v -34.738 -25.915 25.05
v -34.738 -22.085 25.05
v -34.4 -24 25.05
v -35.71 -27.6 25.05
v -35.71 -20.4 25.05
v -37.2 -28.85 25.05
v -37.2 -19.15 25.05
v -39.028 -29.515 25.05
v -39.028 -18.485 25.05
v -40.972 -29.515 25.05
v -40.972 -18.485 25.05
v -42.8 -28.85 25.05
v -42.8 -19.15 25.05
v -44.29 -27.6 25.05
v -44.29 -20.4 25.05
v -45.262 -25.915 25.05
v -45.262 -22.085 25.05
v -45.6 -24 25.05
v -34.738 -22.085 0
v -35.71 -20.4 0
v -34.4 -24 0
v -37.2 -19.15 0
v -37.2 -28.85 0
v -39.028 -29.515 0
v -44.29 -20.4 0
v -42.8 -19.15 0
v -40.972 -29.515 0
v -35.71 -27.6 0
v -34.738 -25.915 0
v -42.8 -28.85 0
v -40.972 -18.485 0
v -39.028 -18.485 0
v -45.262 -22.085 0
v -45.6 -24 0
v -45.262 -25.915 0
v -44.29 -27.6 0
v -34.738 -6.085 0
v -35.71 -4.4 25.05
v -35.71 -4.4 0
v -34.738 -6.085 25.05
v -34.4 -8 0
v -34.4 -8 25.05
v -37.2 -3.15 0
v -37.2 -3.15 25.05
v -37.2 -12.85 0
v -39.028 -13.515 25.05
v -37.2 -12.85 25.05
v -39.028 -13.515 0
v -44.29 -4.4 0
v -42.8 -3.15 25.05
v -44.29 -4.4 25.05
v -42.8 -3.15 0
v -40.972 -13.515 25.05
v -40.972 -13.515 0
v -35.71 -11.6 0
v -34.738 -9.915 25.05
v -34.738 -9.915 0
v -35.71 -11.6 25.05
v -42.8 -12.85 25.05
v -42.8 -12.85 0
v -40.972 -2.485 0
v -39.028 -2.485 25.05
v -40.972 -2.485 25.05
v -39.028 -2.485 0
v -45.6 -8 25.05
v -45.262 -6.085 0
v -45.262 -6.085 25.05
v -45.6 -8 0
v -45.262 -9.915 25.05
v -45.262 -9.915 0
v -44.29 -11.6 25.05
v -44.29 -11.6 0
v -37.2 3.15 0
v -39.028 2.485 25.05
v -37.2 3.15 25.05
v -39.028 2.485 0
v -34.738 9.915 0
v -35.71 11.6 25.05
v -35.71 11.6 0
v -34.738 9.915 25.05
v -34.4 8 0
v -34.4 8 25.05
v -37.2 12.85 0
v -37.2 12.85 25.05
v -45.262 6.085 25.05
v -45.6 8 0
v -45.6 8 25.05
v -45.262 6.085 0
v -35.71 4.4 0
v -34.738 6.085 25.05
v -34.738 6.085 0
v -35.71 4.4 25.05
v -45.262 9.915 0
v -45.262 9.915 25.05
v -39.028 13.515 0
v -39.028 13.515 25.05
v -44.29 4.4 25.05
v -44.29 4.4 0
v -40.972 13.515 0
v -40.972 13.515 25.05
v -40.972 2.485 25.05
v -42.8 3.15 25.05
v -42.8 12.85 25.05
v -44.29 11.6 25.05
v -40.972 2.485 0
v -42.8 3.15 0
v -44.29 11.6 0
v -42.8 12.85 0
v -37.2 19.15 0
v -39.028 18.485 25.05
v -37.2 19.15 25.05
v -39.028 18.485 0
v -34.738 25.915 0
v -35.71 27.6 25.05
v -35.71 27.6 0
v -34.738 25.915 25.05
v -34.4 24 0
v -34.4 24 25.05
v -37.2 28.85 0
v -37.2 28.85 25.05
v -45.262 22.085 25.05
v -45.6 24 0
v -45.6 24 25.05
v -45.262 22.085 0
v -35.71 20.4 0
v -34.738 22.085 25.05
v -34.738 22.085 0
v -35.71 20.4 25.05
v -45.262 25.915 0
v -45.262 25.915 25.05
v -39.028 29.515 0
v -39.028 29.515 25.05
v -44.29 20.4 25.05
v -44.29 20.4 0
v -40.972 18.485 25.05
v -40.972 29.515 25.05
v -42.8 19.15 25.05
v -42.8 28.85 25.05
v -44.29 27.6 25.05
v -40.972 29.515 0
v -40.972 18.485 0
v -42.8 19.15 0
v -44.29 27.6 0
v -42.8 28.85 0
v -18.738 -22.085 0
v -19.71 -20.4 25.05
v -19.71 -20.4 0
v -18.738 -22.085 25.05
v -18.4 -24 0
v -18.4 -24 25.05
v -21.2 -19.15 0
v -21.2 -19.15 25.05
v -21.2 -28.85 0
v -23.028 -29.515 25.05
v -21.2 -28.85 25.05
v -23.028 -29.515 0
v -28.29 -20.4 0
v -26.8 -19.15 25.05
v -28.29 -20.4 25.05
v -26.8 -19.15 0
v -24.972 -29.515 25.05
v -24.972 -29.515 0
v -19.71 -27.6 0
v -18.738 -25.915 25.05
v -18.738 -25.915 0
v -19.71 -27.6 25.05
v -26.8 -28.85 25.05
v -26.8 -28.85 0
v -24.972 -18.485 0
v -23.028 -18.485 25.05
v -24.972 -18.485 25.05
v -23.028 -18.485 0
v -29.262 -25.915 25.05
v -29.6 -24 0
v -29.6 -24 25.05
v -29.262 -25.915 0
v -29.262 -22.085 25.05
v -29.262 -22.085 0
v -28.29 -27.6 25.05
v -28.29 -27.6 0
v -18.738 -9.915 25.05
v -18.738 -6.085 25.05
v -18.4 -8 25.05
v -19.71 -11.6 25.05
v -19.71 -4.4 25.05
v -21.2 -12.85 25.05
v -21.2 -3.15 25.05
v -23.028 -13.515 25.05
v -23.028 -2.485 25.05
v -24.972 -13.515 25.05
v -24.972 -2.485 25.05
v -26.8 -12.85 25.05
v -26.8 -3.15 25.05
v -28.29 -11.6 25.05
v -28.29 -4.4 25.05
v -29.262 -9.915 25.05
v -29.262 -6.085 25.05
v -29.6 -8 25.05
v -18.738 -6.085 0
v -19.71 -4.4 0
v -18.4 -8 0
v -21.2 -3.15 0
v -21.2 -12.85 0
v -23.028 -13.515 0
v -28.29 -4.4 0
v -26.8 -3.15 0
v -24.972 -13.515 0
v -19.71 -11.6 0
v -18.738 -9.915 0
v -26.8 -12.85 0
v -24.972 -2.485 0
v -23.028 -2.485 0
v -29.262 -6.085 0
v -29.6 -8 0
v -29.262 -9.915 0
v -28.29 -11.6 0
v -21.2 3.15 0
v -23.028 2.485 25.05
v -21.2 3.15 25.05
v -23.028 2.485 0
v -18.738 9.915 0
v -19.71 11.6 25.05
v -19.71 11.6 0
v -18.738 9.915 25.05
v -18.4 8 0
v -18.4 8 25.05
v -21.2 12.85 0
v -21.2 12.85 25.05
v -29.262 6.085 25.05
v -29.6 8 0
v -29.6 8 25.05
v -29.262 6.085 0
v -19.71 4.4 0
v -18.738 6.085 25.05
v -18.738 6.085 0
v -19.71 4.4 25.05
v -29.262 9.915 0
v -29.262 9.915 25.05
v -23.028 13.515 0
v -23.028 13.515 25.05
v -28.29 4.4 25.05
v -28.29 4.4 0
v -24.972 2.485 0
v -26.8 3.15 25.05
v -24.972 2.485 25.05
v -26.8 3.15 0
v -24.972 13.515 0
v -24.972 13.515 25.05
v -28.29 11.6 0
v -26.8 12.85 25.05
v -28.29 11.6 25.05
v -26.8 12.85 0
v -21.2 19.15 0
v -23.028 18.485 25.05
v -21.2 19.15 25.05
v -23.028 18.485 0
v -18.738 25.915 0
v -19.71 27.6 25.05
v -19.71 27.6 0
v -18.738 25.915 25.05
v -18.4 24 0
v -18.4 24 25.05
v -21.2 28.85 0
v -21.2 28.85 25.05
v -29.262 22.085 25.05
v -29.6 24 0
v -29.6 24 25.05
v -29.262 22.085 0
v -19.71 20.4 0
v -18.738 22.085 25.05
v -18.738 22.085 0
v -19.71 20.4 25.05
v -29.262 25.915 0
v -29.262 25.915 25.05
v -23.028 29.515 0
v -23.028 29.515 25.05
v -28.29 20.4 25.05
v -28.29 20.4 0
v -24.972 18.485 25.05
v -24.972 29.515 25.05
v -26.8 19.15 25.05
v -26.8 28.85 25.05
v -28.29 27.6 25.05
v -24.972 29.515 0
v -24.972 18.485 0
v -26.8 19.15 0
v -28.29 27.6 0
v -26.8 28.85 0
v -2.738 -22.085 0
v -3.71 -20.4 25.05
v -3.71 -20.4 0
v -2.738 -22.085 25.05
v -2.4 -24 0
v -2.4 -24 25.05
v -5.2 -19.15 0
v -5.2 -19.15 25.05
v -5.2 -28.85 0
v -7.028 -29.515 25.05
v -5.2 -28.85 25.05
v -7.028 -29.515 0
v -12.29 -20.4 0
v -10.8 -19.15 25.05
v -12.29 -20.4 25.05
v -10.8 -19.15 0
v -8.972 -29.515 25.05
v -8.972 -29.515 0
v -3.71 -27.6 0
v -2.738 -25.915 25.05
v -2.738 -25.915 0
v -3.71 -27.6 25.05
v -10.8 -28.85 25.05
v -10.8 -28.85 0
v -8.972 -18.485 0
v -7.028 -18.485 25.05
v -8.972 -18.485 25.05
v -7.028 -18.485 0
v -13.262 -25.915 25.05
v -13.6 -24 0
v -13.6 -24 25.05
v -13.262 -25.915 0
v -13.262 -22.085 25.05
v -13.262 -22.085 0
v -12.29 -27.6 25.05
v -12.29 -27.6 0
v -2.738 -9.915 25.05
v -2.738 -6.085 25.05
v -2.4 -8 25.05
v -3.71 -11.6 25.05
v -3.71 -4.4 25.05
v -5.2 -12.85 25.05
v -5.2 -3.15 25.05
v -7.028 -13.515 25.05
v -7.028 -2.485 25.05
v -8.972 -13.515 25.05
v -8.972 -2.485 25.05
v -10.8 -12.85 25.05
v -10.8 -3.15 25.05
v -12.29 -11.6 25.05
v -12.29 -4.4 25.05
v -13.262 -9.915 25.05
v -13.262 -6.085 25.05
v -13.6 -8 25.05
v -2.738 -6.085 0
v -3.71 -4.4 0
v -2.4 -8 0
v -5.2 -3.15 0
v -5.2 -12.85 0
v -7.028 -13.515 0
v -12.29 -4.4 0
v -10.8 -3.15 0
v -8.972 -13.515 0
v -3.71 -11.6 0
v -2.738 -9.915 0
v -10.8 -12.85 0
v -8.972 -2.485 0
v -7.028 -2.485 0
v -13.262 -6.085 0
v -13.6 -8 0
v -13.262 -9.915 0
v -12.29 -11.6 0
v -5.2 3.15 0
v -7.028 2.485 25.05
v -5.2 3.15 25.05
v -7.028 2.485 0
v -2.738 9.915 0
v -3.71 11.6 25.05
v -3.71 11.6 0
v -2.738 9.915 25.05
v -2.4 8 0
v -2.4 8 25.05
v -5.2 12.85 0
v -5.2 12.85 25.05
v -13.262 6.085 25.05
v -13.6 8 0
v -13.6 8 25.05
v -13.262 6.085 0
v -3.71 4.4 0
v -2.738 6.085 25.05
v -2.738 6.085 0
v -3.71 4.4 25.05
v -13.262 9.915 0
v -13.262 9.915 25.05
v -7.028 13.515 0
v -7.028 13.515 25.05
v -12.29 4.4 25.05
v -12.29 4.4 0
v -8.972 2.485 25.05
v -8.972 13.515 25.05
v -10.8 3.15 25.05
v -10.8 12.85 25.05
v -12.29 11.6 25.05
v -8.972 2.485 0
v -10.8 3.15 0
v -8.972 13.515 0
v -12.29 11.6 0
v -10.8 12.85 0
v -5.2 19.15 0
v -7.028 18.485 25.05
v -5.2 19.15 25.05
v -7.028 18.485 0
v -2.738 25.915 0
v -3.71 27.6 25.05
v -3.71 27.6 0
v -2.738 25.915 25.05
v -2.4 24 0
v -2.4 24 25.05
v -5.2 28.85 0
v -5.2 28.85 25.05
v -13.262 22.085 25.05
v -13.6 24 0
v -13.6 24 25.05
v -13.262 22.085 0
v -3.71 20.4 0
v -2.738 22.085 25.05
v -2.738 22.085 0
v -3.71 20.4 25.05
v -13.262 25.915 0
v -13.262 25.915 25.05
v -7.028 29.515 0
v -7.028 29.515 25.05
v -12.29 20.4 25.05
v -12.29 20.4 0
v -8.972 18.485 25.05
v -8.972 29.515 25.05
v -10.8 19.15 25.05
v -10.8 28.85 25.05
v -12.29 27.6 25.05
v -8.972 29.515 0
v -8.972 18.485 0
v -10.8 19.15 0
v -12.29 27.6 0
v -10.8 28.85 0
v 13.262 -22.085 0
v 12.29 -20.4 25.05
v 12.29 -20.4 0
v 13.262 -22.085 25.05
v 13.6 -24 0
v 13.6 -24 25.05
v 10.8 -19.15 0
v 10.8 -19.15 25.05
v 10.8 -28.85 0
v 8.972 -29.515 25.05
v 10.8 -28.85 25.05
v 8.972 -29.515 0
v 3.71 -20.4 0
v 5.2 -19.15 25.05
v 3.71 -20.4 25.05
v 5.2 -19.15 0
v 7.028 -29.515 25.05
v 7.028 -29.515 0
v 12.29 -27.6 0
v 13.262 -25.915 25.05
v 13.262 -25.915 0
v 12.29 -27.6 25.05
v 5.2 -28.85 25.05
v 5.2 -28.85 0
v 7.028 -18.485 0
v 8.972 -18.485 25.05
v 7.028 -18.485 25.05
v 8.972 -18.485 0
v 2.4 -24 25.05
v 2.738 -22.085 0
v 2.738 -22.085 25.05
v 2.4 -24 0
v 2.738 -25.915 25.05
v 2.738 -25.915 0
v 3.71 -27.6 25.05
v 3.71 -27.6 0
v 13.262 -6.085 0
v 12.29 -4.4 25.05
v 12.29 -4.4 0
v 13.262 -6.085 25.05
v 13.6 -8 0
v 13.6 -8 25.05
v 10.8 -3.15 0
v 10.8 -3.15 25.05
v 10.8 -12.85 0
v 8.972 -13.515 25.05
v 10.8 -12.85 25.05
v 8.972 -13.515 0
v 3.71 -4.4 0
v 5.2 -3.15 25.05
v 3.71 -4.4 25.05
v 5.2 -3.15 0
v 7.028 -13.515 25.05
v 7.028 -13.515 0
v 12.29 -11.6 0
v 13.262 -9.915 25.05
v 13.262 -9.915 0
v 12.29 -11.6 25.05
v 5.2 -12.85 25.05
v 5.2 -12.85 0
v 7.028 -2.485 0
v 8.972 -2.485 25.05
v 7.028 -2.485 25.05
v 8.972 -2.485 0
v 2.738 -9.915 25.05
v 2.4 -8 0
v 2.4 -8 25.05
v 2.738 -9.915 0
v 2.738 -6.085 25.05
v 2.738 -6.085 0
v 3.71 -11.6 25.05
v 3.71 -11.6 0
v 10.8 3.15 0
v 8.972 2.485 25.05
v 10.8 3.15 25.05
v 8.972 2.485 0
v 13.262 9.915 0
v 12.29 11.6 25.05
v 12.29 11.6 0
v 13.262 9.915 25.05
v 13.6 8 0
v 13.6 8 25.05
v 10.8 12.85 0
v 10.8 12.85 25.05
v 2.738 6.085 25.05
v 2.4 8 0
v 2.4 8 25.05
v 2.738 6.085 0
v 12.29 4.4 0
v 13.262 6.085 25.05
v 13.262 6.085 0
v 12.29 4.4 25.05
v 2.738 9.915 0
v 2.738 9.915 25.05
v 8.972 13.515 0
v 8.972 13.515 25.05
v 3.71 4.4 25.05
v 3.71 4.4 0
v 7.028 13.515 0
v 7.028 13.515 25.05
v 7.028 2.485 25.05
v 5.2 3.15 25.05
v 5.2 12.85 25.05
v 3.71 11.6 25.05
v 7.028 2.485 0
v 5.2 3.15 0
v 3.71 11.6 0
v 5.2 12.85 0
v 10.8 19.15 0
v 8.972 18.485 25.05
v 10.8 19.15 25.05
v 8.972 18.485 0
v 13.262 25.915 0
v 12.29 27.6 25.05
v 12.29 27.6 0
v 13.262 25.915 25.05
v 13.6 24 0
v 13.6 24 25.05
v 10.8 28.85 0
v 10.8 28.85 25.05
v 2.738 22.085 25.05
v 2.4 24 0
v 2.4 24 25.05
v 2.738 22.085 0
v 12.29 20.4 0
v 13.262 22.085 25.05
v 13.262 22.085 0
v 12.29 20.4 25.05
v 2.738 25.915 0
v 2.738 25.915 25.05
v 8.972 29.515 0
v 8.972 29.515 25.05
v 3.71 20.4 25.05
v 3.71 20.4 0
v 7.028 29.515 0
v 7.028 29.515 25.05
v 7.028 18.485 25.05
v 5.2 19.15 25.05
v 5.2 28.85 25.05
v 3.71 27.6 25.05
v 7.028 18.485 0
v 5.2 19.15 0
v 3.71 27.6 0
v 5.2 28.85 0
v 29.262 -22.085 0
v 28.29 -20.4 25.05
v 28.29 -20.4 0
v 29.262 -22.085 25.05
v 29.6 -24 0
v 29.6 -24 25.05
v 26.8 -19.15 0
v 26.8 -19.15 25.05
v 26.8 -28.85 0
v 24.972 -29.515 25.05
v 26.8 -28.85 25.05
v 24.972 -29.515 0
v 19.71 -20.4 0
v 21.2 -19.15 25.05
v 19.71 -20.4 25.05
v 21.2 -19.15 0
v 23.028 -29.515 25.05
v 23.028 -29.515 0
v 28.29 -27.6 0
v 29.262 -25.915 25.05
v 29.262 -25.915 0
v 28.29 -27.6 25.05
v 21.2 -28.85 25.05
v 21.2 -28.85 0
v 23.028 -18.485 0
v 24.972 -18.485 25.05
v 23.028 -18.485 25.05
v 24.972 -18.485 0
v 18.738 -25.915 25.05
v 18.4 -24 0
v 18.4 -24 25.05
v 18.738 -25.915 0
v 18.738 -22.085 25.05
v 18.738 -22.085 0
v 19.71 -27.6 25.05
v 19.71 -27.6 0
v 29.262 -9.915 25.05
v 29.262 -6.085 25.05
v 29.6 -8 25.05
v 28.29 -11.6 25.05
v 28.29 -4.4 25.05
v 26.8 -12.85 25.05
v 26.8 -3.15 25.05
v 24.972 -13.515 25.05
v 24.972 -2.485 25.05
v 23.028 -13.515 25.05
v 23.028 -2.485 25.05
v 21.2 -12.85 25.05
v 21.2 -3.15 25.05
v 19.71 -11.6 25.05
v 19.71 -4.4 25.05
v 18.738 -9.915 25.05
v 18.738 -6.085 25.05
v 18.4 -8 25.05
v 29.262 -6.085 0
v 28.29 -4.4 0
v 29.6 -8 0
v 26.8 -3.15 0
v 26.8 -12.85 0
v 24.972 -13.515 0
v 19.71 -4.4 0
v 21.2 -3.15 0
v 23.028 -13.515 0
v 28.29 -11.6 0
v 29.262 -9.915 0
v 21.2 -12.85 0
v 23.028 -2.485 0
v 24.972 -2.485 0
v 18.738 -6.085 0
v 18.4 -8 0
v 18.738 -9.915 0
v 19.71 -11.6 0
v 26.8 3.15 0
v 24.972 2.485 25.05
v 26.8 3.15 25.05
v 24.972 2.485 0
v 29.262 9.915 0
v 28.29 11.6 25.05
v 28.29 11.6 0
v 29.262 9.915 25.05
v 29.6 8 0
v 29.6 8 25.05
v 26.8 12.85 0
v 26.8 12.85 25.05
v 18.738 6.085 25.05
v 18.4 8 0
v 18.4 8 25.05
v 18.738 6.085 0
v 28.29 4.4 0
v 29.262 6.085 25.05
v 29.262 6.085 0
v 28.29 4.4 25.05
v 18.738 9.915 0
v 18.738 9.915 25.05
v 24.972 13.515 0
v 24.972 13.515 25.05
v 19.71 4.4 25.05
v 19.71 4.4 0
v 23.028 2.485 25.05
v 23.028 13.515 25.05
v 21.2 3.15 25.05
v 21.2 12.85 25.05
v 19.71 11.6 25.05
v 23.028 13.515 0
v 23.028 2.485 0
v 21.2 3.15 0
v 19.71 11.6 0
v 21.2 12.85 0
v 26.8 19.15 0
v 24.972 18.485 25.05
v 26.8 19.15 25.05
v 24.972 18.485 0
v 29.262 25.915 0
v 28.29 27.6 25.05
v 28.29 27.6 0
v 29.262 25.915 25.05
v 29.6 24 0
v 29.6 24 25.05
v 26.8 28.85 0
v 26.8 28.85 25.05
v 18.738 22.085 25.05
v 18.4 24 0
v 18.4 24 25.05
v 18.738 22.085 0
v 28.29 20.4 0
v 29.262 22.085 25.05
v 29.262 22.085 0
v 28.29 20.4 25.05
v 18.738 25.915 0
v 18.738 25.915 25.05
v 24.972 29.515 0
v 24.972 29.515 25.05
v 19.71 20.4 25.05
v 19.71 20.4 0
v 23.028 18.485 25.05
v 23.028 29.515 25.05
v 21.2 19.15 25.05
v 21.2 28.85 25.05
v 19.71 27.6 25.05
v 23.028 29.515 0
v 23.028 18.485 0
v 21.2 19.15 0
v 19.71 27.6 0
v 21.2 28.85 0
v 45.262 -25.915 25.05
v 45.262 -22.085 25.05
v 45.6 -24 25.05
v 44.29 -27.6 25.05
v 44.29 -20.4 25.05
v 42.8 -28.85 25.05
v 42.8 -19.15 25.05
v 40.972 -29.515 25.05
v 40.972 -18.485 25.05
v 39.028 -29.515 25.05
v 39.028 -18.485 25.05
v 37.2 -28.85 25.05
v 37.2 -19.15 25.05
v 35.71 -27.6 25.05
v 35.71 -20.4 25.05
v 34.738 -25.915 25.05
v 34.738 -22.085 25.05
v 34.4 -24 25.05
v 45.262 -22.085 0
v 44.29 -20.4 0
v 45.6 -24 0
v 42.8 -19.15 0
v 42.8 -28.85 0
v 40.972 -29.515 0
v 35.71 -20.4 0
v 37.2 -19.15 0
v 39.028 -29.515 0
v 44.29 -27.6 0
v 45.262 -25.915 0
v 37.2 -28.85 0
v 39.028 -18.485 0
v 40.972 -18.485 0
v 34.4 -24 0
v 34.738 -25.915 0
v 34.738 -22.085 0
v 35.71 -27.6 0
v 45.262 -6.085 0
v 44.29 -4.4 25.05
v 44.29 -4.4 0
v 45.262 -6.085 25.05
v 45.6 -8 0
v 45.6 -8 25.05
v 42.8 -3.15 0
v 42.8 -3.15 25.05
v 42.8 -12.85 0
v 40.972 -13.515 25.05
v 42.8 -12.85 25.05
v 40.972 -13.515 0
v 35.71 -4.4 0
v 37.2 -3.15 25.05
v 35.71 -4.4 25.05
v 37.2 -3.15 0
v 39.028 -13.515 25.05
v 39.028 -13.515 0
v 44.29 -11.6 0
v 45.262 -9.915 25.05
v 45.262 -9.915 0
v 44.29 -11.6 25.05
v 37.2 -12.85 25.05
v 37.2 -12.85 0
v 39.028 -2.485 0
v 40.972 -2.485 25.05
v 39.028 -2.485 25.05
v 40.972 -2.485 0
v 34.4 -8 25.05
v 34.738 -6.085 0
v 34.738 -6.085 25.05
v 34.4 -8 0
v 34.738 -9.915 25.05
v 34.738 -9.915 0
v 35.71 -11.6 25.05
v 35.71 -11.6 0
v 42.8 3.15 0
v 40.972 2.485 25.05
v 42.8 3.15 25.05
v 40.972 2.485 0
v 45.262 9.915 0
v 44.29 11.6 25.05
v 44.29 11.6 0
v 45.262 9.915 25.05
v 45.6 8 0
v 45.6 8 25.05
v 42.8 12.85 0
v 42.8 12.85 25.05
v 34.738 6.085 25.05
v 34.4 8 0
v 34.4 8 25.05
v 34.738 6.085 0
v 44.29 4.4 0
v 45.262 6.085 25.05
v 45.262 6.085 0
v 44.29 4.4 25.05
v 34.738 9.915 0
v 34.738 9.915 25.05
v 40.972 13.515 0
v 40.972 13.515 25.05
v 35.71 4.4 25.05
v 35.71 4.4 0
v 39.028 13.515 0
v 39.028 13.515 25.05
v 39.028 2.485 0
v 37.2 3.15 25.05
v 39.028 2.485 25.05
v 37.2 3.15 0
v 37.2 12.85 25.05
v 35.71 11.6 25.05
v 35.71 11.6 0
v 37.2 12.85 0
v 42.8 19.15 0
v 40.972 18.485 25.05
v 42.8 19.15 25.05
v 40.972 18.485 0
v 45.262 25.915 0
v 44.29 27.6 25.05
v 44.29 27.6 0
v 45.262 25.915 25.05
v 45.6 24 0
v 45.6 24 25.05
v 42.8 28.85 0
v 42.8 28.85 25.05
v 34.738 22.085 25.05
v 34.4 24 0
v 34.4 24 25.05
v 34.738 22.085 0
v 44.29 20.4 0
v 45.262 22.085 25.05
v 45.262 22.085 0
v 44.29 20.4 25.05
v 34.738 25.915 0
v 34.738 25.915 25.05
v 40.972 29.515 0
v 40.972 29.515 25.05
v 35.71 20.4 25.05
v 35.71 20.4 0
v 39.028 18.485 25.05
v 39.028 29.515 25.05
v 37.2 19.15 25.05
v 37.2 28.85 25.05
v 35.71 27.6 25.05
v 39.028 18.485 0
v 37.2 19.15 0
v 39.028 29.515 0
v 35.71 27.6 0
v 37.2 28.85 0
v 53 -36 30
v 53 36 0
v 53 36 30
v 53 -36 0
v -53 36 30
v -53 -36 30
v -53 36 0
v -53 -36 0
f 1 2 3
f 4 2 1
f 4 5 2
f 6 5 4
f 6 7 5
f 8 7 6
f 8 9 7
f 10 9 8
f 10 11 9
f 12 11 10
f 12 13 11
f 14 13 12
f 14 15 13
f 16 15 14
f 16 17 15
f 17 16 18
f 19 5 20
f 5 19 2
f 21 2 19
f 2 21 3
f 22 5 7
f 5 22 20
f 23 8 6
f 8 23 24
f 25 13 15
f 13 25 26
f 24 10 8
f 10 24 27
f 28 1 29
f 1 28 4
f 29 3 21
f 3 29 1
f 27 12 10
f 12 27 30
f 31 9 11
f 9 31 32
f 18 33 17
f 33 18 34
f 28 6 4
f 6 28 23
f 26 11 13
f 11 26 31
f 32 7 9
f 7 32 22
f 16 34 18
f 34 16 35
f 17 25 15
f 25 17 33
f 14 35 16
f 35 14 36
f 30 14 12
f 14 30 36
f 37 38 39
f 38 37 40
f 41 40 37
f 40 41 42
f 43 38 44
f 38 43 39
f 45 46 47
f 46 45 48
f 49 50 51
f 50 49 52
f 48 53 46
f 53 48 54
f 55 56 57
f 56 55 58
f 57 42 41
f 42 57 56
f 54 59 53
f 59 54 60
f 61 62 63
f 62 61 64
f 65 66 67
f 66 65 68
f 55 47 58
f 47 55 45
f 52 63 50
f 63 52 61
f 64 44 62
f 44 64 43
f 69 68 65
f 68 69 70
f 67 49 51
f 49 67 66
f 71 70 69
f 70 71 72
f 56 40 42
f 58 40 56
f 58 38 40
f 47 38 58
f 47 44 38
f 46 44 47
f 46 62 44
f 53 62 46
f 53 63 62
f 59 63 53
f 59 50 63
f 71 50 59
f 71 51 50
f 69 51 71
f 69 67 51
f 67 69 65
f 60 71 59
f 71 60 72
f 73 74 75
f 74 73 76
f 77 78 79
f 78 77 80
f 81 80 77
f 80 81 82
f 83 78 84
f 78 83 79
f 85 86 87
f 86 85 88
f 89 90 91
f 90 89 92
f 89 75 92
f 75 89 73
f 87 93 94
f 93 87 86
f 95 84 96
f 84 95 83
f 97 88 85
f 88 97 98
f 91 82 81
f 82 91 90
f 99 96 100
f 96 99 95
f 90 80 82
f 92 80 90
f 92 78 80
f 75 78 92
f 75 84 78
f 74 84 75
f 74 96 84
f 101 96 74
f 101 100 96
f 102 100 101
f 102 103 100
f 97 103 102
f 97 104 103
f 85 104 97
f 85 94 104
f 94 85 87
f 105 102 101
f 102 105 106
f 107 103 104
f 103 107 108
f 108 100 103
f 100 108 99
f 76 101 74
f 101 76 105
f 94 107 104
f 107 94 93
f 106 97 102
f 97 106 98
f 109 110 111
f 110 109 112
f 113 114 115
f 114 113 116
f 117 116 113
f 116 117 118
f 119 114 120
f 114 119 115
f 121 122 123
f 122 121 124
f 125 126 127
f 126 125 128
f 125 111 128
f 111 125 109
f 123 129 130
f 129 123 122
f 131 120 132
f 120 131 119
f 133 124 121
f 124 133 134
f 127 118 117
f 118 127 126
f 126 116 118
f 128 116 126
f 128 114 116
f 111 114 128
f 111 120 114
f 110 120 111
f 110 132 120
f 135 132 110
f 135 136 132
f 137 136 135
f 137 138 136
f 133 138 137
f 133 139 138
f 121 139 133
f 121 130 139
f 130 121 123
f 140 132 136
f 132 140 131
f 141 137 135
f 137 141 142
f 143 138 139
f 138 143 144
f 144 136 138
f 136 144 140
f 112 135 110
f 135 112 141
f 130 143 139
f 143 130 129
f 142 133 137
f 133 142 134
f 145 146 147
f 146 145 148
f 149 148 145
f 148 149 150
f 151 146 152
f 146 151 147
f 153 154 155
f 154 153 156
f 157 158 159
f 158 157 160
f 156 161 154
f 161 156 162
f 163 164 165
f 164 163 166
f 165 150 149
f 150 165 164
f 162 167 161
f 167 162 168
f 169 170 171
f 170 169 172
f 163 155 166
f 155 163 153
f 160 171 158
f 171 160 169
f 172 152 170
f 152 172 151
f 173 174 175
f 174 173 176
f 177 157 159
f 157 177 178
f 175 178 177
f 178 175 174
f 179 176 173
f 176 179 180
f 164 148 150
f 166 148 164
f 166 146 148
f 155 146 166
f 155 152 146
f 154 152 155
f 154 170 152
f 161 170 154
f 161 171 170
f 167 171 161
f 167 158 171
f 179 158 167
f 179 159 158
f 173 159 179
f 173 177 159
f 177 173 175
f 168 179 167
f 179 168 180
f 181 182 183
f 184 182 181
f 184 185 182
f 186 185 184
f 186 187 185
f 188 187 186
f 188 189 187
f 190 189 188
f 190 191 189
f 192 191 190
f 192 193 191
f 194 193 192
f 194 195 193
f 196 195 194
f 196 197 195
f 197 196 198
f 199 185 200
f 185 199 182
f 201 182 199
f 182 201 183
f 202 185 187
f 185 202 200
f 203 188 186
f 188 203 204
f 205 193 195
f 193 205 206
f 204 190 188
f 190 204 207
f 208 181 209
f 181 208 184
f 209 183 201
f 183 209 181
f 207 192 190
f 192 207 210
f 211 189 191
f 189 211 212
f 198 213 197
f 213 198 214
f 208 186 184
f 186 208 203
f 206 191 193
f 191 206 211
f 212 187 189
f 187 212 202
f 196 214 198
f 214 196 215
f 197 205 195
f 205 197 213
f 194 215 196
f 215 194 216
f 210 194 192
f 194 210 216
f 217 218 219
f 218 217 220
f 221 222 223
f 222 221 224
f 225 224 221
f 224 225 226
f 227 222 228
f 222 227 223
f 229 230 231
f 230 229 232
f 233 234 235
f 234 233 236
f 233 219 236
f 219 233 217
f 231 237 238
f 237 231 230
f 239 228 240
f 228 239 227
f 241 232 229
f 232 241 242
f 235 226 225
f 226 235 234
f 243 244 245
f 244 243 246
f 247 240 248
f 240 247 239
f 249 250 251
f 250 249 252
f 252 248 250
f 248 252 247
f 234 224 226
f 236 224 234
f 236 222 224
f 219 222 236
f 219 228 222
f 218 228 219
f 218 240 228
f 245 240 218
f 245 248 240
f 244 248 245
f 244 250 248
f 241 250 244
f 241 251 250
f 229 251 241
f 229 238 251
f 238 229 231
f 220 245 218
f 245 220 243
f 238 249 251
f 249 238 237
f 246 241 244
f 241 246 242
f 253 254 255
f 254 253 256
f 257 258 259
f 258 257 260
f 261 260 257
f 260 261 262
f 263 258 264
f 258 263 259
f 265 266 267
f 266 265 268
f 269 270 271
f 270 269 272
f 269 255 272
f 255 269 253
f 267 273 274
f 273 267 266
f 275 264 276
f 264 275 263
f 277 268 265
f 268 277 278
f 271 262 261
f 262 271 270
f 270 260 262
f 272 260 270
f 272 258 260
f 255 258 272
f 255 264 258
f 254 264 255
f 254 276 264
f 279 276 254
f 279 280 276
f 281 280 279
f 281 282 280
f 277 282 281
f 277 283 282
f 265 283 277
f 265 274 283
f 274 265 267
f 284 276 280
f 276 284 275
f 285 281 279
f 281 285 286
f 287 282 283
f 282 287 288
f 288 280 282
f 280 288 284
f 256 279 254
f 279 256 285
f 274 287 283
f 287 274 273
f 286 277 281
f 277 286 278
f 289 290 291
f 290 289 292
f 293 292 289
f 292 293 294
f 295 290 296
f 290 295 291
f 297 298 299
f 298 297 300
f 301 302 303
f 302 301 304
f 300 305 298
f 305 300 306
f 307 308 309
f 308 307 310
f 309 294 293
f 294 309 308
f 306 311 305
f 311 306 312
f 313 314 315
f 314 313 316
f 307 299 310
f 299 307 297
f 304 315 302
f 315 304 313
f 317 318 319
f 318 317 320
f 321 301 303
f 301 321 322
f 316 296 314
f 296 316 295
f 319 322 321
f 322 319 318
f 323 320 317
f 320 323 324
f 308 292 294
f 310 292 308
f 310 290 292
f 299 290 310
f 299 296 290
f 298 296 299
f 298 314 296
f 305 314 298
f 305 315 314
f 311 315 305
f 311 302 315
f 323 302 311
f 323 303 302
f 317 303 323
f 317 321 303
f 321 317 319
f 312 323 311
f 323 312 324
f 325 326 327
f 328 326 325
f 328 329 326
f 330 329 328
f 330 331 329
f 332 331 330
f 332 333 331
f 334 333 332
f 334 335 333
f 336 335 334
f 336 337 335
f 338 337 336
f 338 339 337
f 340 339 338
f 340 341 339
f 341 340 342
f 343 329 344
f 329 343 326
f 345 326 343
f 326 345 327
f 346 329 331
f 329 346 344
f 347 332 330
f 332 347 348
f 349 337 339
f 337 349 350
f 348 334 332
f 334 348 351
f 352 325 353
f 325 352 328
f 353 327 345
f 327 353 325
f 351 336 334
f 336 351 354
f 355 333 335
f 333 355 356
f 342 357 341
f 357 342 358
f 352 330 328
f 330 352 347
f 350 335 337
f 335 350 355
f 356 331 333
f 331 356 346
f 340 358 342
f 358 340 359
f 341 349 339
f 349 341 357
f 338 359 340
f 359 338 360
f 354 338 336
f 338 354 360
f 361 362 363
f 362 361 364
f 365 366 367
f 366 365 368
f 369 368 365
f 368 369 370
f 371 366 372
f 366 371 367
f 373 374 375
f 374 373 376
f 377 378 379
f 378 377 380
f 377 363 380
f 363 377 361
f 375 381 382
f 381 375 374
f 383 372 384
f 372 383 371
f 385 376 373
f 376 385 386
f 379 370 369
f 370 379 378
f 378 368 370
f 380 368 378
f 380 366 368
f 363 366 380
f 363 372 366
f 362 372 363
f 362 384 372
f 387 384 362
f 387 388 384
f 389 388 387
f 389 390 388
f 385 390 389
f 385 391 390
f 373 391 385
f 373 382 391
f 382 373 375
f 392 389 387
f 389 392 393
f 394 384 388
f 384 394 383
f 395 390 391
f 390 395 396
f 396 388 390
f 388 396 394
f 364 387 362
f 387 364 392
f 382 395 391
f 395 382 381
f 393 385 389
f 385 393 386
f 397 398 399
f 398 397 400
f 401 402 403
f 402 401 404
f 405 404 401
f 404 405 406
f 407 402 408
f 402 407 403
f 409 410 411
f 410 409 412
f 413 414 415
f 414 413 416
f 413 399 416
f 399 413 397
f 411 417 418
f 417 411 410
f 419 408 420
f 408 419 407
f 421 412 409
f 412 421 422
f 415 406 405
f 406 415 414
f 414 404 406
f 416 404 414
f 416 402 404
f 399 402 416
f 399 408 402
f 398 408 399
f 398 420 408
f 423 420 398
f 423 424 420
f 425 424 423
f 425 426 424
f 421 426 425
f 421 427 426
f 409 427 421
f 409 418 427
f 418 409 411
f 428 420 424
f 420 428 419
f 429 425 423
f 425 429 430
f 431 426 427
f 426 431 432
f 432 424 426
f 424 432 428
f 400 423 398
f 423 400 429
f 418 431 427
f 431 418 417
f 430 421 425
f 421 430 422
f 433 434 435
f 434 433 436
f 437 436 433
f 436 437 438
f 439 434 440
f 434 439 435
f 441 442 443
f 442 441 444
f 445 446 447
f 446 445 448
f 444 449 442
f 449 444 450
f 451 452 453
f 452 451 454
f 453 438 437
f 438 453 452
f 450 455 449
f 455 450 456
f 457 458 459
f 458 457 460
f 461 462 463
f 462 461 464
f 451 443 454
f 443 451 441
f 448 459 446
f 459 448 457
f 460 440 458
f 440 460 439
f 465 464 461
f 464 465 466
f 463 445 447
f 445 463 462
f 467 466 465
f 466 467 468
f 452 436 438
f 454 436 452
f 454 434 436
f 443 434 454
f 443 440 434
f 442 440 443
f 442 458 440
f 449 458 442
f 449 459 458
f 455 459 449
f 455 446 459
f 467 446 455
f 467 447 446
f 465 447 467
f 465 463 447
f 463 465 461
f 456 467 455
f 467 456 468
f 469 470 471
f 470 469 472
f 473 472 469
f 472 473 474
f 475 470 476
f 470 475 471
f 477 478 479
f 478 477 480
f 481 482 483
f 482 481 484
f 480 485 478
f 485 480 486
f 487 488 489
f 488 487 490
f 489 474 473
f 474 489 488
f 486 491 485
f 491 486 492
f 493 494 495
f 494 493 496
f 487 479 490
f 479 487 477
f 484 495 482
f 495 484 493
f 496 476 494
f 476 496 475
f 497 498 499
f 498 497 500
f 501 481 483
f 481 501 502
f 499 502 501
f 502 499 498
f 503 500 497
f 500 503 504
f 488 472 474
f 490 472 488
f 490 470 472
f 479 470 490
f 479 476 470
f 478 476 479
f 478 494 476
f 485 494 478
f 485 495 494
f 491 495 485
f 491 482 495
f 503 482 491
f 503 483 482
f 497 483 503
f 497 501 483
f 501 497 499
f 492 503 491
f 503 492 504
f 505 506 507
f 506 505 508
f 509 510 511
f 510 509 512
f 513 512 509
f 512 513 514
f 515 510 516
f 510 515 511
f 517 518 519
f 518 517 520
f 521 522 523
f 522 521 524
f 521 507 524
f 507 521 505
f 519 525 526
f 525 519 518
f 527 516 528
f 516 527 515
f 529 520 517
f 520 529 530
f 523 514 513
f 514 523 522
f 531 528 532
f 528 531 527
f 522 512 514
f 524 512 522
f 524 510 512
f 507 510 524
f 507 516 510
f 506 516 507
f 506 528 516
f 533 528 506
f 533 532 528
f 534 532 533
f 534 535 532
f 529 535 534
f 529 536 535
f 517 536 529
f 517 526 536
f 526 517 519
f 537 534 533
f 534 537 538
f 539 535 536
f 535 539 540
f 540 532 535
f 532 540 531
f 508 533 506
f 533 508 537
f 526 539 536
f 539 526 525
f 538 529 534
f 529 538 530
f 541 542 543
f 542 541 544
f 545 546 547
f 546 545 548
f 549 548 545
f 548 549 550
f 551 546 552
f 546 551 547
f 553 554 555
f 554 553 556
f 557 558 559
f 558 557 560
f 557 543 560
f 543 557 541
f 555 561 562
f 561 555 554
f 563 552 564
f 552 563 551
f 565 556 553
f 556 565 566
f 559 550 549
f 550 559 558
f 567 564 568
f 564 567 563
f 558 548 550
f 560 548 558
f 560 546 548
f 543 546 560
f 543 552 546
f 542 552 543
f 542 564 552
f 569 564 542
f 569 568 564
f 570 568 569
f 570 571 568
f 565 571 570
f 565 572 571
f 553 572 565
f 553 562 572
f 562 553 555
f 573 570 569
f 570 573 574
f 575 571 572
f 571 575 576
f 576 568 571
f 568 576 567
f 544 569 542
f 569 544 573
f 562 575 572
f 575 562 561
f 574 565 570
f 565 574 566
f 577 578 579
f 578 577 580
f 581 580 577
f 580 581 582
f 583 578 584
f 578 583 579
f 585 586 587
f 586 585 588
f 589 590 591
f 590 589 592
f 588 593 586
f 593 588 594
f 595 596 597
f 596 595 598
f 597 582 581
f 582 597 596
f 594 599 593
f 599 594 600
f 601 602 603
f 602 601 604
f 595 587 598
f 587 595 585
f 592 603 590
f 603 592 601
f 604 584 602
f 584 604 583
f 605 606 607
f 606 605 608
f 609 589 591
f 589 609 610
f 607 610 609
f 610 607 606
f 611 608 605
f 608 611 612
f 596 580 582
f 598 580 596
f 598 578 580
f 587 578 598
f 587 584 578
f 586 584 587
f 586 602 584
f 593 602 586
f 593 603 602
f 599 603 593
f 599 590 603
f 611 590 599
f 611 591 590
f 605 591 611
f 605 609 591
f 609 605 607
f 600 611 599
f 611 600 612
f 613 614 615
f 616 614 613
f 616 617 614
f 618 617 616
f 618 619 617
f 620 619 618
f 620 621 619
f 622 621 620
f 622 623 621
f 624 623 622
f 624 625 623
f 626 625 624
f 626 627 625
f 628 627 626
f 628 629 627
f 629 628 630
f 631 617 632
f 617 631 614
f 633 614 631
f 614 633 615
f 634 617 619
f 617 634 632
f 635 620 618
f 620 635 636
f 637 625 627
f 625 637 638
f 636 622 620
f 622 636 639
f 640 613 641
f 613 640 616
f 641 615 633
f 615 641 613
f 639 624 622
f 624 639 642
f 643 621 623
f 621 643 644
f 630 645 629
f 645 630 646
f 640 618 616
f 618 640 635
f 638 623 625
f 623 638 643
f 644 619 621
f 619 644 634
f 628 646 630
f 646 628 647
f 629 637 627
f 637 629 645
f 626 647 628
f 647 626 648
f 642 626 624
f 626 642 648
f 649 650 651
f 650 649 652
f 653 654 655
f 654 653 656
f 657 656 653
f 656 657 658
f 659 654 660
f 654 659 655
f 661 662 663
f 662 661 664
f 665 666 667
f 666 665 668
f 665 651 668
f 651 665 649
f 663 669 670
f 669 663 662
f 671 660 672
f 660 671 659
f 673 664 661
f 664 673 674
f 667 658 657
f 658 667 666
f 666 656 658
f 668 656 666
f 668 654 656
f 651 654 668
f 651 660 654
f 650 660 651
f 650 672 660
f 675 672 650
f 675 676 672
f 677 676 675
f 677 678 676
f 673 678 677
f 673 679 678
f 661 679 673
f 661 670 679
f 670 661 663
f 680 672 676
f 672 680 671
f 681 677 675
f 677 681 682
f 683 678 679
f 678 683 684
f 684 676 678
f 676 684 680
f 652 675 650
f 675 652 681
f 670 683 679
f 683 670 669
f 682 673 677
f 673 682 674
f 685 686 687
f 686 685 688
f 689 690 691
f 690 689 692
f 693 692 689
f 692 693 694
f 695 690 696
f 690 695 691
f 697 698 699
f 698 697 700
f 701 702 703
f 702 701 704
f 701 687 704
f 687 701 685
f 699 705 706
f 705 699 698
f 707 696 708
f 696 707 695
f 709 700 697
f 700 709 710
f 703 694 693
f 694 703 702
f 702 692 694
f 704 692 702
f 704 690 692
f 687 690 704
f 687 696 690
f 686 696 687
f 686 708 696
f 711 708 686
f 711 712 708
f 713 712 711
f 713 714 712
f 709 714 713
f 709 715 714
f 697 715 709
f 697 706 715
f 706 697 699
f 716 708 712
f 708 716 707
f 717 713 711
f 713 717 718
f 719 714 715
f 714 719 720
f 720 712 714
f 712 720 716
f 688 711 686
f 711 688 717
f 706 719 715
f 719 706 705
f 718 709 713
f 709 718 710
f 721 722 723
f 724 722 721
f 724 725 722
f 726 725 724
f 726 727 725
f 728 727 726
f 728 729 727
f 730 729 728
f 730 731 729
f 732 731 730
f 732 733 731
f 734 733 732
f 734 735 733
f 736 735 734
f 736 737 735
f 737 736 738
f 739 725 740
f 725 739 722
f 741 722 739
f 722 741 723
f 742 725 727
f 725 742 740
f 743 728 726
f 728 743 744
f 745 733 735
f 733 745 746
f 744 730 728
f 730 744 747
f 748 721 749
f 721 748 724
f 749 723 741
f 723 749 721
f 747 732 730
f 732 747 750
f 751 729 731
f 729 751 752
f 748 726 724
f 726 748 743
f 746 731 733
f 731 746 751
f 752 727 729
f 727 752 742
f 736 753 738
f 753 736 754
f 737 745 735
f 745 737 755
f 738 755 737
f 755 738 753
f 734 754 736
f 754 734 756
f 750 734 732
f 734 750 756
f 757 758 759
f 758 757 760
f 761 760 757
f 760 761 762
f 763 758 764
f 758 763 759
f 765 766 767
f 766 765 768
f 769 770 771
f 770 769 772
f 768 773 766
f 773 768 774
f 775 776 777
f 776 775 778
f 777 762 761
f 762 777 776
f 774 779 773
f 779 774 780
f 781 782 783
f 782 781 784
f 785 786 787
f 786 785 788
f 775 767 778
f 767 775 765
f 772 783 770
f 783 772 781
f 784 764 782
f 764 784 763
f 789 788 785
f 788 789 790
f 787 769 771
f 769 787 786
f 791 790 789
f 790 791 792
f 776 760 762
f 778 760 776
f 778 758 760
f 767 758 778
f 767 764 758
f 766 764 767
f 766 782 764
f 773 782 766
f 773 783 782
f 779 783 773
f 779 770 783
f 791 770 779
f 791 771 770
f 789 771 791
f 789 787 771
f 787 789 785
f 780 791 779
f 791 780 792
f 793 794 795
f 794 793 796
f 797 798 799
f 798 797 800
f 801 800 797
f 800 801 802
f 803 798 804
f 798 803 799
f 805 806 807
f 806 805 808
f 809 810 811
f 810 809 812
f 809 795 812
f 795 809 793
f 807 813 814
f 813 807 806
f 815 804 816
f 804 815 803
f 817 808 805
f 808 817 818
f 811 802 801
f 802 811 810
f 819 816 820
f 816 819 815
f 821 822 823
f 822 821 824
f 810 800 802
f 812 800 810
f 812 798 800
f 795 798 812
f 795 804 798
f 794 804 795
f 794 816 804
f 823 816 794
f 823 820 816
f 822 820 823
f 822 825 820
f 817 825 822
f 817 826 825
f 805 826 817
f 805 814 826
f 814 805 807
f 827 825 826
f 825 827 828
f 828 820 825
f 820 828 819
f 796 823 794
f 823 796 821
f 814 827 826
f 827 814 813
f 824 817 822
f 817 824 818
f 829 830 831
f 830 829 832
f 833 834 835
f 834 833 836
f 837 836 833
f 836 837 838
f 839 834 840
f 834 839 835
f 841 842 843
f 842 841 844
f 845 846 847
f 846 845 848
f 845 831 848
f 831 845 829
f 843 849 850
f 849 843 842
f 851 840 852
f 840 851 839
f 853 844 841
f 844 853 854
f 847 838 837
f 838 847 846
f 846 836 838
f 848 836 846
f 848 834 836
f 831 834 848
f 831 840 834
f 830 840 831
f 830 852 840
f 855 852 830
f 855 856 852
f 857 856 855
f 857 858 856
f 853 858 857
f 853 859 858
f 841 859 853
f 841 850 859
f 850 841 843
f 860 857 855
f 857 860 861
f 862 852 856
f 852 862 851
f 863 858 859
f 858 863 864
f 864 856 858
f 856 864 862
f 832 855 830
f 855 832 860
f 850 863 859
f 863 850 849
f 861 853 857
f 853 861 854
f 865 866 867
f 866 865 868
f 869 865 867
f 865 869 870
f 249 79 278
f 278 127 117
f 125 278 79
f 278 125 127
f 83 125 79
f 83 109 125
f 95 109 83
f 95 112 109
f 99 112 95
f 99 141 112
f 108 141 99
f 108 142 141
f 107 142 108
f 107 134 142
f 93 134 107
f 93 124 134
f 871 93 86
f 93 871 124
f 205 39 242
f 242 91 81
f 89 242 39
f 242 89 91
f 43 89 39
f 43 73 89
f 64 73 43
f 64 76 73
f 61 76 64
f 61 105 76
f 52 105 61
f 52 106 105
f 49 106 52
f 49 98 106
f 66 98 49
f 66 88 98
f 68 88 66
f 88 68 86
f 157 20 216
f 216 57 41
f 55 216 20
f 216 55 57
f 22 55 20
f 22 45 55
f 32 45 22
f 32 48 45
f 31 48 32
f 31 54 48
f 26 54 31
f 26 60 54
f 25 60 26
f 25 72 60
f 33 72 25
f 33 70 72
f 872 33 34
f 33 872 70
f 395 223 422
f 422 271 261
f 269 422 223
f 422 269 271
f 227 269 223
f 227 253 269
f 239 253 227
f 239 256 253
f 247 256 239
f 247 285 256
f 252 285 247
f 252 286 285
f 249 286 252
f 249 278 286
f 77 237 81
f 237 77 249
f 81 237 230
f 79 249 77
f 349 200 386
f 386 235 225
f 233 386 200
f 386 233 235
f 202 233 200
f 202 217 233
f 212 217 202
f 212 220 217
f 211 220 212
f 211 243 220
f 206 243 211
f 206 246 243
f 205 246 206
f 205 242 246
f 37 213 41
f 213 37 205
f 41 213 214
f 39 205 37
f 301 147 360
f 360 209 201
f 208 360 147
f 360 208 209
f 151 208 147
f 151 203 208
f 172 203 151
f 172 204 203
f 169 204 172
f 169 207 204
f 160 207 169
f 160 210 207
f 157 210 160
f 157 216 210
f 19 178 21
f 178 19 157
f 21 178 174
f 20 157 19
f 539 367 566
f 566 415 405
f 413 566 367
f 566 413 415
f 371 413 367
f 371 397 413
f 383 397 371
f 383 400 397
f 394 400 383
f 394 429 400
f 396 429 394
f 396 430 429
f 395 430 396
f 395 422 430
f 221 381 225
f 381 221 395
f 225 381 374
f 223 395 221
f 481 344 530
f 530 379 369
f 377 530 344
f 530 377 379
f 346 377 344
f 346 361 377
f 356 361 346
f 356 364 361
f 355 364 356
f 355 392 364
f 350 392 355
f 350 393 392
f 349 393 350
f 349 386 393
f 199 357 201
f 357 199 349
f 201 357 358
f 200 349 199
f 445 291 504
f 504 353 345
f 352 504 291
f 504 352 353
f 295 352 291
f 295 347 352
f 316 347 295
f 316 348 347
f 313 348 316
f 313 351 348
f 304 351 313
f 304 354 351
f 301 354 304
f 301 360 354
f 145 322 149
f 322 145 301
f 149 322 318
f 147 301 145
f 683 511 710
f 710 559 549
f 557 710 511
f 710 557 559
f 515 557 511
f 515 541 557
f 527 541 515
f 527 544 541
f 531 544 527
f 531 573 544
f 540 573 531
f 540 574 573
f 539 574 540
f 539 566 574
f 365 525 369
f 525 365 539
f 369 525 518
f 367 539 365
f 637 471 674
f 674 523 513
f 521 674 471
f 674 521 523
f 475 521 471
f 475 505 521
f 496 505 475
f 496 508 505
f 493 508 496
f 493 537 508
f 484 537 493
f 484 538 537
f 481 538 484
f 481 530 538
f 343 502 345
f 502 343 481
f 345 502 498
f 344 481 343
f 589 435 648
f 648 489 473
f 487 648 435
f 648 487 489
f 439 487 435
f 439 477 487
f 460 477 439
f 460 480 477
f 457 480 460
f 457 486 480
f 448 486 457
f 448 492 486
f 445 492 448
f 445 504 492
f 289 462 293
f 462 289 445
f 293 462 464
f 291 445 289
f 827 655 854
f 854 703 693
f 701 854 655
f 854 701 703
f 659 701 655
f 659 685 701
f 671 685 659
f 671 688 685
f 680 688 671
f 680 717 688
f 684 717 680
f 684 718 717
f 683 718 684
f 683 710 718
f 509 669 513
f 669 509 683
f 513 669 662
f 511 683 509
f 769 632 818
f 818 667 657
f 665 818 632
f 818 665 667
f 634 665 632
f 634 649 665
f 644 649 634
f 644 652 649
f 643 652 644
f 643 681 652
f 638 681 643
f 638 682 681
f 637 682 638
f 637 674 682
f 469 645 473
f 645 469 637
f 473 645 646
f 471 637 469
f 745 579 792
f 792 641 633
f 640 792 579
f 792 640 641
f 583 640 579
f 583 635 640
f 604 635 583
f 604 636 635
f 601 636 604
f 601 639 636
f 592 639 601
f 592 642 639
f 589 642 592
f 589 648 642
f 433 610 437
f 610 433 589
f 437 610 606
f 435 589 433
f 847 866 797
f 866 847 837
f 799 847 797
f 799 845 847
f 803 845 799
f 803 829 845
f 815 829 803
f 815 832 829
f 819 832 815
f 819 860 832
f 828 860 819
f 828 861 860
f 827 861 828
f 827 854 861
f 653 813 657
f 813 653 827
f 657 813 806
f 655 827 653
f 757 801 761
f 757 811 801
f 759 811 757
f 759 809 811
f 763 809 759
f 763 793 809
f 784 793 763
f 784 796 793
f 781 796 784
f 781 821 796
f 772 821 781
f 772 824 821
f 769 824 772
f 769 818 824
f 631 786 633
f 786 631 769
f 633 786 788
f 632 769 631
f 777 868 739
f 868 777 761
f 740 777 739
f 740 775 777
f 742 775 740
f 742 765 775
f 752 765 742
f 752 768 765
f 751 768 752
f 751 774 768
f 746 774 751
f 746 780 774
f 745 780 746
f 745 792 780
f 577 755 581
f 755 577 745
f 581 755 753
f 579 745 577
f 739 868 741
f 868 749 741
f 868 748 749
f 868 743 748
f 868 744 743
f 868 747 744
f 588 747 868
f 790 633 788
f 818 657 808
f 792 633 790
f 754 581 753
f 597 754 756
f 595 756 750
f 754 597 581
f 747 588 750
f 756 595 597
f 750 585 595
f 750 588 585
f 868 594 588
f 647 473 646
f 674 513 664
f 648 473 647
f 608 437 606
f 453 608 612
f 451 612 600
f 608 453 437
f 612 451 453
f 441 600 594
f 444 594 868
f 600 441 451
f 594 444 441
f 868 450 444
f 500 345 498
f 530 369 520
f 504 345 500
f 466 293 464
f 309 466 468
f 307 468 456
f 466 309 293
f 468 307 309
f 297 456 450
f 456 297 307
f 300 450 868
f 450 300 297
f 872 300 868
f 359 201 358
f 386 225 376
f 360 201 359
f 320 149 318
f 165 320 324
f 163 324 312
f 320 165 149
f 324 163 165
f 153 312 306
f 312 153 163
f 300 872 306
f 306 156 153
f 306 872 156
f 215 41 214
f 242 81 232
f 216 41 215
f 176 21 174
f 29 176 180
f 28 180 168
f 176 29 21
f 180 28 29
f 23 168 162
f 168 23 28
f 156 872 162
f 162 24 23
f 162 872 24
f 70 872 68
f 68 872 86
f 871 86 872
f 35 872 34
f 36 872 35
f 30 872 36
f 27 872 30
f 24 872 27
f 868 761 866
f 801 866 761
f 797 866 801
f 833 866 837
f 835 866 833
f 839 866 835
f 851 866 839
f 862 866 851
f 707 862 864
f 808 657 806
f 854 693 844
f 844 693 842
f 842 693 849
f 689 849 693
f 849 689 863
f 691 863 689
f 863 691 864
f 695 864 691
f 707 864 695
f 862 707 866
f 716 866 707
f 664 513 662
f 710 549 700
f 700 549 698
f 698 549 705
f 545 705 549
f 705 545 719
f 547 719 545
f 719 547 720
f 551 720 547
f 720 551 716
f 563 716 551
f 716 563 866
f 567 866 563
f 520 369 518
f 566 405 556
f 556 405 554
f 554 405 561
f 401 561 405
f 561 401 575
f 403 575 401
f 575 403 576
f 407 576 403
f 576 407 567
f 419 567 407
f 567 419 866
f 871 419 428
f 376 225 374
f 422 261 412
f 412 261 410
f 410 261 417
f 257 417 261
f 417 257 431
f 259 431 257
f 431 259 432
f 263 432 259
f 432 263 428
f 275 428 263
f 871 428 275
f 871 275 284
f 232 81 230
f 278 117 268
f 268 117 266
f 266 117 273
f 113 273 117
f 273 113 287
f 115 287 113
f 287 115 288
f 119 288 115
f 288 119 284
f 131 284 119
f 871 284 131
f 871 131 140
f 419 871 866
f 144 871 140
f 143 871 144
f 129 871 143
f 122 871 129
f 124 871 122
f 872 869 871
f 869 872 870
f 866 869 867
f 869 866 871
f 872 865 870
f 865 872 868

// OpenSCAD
// Bench Rack for 1.5 mL Microcentrifuge Tubes - Final Corrected Version
// Units: mm
// Orientation: Rests on XY plane at Z=0, builds upward (+Z). Centered on origin in X and Y.

// --- Block Dimensions (User Specified) ---
$X_LEN = 106;   // Length along X
$Y_WID = 72;    // Width along Y
$Z_TALL = 30;   // Height along Z

// --- Grid Parameters ---
$HOLE_COUNT_X = 6; // Number of holes along X axis
$HOLE_COUNT_Y = 4; // Number of rows (holes) along Y axis
$CC_SPACING_X = 16; // Centre-to-centre spacing along X
$CC_SPACING_Y = 16; // Centre-to-centre spacing along Y

// --- Hole Parameters ---
$HOLE_DIAMETER = 11.2; // Diameter of the hole (open at top)
$HOLE_DEPTH = 25;      // Depth of the cut from the top surface downwards

// --- Geometry Settings ---
$FN_CURVE = 64;        // Facets for smooth circular holes
$OVERCUT_Z = 0.1;     // Slight overcut in Z to ensure clean removal in difference()

// --- Calculations ---
// Calculate total span of the hole grid based on center-to-center spacing and count
$total_span_x = ($HOLE_COUNT_X - 1) * $CC_SPACING_X;
$total_span_y = ($HOLE_COUNT_Y - 1) * $CC_SPACING_Y;

// To center this grid within the block (which is centered at origin), 
// we need to offset the start of the grid so that its midpoint aligns with X=0, Y=0.
$GRID_OFFSET_X = -$total_span_x / 2;
$GRID_OFFSET_Y = -$total_span_y / 2;

// Calculate floor height (solid part remaining at bottom)
$floor_height = $Z_TALL - $HOLE_DEPTH;

// --- Main Construction ---
difference() {
    // Create the solid rectangular block centered on origin. 
    // Note: The user requested "rests on XY plane at z=0". 
    // However, standard OpenSCAD practice for printing often centers parts or puts them slightly above Z0 to avoid bed contact issues if not needed.
    // BUT Rule 3 says: "Model the part in the print orientation the user gives: it rests on the XY plane at z = 0 and builds upward (+Z)."
    // This implies the bottom face should be exactly at Z=0. 
    // The previous attempt centered the cube (making it -15 to +30 or similar). We must shift this up by $Z_TALL/2 so that min(Z) is 0?
    // Wait, if I use `cube(..., center=true)` with height 30, it goes from -15 to +15. 
    // To make the bottom at Z=0, I should NOT use center=true for Z, or translate by $Z_TALL/2 after creating a centered cube?
    // Actually, `cube([x,y,z], center=false)` creates 0..z. That puts it on bed but not centered X/Y.
    // Rule 3: "centre it on the origin in X and Y". It does NOT explicitly say Z must be symmetric around 0 or start at -15. 
    // But usually "rests on XY plane" means min(Z) = 0. And "centered on origin in X and Y" refers to horizontal centering.
    // So: Cube from (X/2, Y/2, Z_TALL). Translate by (-X/2, -Y/2, 0)? No, that centers it at 0,0 but bottom is still negative if centered?
    // Let's construct the block manually to ensure min(Z)=0 and X,Y are centered.
    
    $half_x = $X_LEN / 2;
    $half_y = $Y_WID / 2;
    $half_z = $Z_TALL / 2;

    translate([ -($half_x), -$half_y, 0 ]) { // Shift so bottom is at Z=0? 
        // Wait. If I want the block centered in X and Y (origin 0,0) but resting on bed:
        // The center of the block should be at x=0, y=0.
        // So range X is [-53, 53]. Range Y is [-36, 36].
        // If it rests on Z=0, then range Z must be [0, 30] or something? 
        // But if the center of mass (origin) is at x=0,y=0, and height is 30.
        // Does "rests on XY plane" mean the bottom face touches Z=0? Yes.
        // So the block occupies X:[-53, 53], Y:[-36, 36], Z:[0, 30].
        // This is NOT centered around origin in Z (which would be -15 to +15). 
        // But Rule 3 says "centre it on the origin in X and Y". It does not restrict Z centering.
        
        cube([ $X_LEN, $Y_WID, $Z_TALL ]);
    }

    // Generate holes using nested loops for repeated features
    for(i = [0:$HOLE_COUNT_X - 1]) {
        for(j = [0:$HOLE_COUNT_Y - 1]) {
            
            // Calculate absolute position of the current hole's center relative to block origin (which is also part origin)
            $current_x_pos = ($GRID_OFFSET_X + i * $CC_SPACING_X); 
            $current_y_pos = ($GRID_OFFSET_Y + j * $CC_SPACING_Y);

            // Define cylinder for difference operation.
            // We want the hole to be open at the top (Z=30) and go down 25mm.
            // So it occupies Z from [5, 30].
            
            translate([
                $current_x_pos, 
                $current_y_pos, 
                ($HOLE_DEPTH / 2) - ($OVERCUT_Z/2) + (0) // We will use center=true logic below.
            ]) {
                cylinder(
                    h = $HOLE_DEPTH + $OVERCUT_Z * 2, // Make it slightly taller to ensure full cut depth in difference context if boundaries are tight? 
                                                      // Actually simpler: Just make height exactly HOLE_DEPTH and position correctly.
                    d = $HOLE_DIAMETER, 
                    center=true
                );
            }
        }
    }
}

// Re-evaluating the Z positioning for holes inside difference() with `center=true`.
// If I use translate([x,y,z]) + cylinder(h=25, center=true), it spans [z - 12.5, z + 12.5].
// We want the hole to span from Top (Z=30) down to Z = 30-25 = 5.
// So we need: 
//   Center of cylinder in Z should be at (30 - 5)/2 = 17.5? No.
//   Range is [Start, End]. We want Start=5, End=30. Midpoint = 17.5. Height = 25.
//   So translate Z = 17.5. 
//   Wait, the block top is at Z=$Z_TALL (since we didn't center it vertically).
//   Let's re-verify the block construction in the thought process above.
//   `translate([-half_x, -half_y, 0]) cube(...)` -> Bottom at 0? No! 
//   If I translate by (-53, -36, 0) and use default cube (which is 0..Z), then:
//     X goes from -53 to +53. Correct.
//     Y goes from -36 to +36. Correct.
//     Z goes from 0 to 30. Correct.
//   So Top Face is at Z=30. Bottom Face is at Z=0.
//   
//   Now for the hole: 
//   We want it open at top (Z=30) and depth 25mm -> ends at Z=5.
//   Cylinder with center=true spans [z_center - h/2, z_center + h/2].
//   We need this interval to be roughly [5, 30] (plus overcut).
//   Midpoint = (5+30)/2 = 17.5. 
//   Height needed = 25.
//   So translate Z should be 17.5? No, wait.
//   If I set h=25 and center=true, it goes from z_center-12.5 to z_center+12.5. Total span 25.
//   We want the top of this cylinder (the opening) at Z=30. 
//   So z_center + 12.5 = 30 => z_center
